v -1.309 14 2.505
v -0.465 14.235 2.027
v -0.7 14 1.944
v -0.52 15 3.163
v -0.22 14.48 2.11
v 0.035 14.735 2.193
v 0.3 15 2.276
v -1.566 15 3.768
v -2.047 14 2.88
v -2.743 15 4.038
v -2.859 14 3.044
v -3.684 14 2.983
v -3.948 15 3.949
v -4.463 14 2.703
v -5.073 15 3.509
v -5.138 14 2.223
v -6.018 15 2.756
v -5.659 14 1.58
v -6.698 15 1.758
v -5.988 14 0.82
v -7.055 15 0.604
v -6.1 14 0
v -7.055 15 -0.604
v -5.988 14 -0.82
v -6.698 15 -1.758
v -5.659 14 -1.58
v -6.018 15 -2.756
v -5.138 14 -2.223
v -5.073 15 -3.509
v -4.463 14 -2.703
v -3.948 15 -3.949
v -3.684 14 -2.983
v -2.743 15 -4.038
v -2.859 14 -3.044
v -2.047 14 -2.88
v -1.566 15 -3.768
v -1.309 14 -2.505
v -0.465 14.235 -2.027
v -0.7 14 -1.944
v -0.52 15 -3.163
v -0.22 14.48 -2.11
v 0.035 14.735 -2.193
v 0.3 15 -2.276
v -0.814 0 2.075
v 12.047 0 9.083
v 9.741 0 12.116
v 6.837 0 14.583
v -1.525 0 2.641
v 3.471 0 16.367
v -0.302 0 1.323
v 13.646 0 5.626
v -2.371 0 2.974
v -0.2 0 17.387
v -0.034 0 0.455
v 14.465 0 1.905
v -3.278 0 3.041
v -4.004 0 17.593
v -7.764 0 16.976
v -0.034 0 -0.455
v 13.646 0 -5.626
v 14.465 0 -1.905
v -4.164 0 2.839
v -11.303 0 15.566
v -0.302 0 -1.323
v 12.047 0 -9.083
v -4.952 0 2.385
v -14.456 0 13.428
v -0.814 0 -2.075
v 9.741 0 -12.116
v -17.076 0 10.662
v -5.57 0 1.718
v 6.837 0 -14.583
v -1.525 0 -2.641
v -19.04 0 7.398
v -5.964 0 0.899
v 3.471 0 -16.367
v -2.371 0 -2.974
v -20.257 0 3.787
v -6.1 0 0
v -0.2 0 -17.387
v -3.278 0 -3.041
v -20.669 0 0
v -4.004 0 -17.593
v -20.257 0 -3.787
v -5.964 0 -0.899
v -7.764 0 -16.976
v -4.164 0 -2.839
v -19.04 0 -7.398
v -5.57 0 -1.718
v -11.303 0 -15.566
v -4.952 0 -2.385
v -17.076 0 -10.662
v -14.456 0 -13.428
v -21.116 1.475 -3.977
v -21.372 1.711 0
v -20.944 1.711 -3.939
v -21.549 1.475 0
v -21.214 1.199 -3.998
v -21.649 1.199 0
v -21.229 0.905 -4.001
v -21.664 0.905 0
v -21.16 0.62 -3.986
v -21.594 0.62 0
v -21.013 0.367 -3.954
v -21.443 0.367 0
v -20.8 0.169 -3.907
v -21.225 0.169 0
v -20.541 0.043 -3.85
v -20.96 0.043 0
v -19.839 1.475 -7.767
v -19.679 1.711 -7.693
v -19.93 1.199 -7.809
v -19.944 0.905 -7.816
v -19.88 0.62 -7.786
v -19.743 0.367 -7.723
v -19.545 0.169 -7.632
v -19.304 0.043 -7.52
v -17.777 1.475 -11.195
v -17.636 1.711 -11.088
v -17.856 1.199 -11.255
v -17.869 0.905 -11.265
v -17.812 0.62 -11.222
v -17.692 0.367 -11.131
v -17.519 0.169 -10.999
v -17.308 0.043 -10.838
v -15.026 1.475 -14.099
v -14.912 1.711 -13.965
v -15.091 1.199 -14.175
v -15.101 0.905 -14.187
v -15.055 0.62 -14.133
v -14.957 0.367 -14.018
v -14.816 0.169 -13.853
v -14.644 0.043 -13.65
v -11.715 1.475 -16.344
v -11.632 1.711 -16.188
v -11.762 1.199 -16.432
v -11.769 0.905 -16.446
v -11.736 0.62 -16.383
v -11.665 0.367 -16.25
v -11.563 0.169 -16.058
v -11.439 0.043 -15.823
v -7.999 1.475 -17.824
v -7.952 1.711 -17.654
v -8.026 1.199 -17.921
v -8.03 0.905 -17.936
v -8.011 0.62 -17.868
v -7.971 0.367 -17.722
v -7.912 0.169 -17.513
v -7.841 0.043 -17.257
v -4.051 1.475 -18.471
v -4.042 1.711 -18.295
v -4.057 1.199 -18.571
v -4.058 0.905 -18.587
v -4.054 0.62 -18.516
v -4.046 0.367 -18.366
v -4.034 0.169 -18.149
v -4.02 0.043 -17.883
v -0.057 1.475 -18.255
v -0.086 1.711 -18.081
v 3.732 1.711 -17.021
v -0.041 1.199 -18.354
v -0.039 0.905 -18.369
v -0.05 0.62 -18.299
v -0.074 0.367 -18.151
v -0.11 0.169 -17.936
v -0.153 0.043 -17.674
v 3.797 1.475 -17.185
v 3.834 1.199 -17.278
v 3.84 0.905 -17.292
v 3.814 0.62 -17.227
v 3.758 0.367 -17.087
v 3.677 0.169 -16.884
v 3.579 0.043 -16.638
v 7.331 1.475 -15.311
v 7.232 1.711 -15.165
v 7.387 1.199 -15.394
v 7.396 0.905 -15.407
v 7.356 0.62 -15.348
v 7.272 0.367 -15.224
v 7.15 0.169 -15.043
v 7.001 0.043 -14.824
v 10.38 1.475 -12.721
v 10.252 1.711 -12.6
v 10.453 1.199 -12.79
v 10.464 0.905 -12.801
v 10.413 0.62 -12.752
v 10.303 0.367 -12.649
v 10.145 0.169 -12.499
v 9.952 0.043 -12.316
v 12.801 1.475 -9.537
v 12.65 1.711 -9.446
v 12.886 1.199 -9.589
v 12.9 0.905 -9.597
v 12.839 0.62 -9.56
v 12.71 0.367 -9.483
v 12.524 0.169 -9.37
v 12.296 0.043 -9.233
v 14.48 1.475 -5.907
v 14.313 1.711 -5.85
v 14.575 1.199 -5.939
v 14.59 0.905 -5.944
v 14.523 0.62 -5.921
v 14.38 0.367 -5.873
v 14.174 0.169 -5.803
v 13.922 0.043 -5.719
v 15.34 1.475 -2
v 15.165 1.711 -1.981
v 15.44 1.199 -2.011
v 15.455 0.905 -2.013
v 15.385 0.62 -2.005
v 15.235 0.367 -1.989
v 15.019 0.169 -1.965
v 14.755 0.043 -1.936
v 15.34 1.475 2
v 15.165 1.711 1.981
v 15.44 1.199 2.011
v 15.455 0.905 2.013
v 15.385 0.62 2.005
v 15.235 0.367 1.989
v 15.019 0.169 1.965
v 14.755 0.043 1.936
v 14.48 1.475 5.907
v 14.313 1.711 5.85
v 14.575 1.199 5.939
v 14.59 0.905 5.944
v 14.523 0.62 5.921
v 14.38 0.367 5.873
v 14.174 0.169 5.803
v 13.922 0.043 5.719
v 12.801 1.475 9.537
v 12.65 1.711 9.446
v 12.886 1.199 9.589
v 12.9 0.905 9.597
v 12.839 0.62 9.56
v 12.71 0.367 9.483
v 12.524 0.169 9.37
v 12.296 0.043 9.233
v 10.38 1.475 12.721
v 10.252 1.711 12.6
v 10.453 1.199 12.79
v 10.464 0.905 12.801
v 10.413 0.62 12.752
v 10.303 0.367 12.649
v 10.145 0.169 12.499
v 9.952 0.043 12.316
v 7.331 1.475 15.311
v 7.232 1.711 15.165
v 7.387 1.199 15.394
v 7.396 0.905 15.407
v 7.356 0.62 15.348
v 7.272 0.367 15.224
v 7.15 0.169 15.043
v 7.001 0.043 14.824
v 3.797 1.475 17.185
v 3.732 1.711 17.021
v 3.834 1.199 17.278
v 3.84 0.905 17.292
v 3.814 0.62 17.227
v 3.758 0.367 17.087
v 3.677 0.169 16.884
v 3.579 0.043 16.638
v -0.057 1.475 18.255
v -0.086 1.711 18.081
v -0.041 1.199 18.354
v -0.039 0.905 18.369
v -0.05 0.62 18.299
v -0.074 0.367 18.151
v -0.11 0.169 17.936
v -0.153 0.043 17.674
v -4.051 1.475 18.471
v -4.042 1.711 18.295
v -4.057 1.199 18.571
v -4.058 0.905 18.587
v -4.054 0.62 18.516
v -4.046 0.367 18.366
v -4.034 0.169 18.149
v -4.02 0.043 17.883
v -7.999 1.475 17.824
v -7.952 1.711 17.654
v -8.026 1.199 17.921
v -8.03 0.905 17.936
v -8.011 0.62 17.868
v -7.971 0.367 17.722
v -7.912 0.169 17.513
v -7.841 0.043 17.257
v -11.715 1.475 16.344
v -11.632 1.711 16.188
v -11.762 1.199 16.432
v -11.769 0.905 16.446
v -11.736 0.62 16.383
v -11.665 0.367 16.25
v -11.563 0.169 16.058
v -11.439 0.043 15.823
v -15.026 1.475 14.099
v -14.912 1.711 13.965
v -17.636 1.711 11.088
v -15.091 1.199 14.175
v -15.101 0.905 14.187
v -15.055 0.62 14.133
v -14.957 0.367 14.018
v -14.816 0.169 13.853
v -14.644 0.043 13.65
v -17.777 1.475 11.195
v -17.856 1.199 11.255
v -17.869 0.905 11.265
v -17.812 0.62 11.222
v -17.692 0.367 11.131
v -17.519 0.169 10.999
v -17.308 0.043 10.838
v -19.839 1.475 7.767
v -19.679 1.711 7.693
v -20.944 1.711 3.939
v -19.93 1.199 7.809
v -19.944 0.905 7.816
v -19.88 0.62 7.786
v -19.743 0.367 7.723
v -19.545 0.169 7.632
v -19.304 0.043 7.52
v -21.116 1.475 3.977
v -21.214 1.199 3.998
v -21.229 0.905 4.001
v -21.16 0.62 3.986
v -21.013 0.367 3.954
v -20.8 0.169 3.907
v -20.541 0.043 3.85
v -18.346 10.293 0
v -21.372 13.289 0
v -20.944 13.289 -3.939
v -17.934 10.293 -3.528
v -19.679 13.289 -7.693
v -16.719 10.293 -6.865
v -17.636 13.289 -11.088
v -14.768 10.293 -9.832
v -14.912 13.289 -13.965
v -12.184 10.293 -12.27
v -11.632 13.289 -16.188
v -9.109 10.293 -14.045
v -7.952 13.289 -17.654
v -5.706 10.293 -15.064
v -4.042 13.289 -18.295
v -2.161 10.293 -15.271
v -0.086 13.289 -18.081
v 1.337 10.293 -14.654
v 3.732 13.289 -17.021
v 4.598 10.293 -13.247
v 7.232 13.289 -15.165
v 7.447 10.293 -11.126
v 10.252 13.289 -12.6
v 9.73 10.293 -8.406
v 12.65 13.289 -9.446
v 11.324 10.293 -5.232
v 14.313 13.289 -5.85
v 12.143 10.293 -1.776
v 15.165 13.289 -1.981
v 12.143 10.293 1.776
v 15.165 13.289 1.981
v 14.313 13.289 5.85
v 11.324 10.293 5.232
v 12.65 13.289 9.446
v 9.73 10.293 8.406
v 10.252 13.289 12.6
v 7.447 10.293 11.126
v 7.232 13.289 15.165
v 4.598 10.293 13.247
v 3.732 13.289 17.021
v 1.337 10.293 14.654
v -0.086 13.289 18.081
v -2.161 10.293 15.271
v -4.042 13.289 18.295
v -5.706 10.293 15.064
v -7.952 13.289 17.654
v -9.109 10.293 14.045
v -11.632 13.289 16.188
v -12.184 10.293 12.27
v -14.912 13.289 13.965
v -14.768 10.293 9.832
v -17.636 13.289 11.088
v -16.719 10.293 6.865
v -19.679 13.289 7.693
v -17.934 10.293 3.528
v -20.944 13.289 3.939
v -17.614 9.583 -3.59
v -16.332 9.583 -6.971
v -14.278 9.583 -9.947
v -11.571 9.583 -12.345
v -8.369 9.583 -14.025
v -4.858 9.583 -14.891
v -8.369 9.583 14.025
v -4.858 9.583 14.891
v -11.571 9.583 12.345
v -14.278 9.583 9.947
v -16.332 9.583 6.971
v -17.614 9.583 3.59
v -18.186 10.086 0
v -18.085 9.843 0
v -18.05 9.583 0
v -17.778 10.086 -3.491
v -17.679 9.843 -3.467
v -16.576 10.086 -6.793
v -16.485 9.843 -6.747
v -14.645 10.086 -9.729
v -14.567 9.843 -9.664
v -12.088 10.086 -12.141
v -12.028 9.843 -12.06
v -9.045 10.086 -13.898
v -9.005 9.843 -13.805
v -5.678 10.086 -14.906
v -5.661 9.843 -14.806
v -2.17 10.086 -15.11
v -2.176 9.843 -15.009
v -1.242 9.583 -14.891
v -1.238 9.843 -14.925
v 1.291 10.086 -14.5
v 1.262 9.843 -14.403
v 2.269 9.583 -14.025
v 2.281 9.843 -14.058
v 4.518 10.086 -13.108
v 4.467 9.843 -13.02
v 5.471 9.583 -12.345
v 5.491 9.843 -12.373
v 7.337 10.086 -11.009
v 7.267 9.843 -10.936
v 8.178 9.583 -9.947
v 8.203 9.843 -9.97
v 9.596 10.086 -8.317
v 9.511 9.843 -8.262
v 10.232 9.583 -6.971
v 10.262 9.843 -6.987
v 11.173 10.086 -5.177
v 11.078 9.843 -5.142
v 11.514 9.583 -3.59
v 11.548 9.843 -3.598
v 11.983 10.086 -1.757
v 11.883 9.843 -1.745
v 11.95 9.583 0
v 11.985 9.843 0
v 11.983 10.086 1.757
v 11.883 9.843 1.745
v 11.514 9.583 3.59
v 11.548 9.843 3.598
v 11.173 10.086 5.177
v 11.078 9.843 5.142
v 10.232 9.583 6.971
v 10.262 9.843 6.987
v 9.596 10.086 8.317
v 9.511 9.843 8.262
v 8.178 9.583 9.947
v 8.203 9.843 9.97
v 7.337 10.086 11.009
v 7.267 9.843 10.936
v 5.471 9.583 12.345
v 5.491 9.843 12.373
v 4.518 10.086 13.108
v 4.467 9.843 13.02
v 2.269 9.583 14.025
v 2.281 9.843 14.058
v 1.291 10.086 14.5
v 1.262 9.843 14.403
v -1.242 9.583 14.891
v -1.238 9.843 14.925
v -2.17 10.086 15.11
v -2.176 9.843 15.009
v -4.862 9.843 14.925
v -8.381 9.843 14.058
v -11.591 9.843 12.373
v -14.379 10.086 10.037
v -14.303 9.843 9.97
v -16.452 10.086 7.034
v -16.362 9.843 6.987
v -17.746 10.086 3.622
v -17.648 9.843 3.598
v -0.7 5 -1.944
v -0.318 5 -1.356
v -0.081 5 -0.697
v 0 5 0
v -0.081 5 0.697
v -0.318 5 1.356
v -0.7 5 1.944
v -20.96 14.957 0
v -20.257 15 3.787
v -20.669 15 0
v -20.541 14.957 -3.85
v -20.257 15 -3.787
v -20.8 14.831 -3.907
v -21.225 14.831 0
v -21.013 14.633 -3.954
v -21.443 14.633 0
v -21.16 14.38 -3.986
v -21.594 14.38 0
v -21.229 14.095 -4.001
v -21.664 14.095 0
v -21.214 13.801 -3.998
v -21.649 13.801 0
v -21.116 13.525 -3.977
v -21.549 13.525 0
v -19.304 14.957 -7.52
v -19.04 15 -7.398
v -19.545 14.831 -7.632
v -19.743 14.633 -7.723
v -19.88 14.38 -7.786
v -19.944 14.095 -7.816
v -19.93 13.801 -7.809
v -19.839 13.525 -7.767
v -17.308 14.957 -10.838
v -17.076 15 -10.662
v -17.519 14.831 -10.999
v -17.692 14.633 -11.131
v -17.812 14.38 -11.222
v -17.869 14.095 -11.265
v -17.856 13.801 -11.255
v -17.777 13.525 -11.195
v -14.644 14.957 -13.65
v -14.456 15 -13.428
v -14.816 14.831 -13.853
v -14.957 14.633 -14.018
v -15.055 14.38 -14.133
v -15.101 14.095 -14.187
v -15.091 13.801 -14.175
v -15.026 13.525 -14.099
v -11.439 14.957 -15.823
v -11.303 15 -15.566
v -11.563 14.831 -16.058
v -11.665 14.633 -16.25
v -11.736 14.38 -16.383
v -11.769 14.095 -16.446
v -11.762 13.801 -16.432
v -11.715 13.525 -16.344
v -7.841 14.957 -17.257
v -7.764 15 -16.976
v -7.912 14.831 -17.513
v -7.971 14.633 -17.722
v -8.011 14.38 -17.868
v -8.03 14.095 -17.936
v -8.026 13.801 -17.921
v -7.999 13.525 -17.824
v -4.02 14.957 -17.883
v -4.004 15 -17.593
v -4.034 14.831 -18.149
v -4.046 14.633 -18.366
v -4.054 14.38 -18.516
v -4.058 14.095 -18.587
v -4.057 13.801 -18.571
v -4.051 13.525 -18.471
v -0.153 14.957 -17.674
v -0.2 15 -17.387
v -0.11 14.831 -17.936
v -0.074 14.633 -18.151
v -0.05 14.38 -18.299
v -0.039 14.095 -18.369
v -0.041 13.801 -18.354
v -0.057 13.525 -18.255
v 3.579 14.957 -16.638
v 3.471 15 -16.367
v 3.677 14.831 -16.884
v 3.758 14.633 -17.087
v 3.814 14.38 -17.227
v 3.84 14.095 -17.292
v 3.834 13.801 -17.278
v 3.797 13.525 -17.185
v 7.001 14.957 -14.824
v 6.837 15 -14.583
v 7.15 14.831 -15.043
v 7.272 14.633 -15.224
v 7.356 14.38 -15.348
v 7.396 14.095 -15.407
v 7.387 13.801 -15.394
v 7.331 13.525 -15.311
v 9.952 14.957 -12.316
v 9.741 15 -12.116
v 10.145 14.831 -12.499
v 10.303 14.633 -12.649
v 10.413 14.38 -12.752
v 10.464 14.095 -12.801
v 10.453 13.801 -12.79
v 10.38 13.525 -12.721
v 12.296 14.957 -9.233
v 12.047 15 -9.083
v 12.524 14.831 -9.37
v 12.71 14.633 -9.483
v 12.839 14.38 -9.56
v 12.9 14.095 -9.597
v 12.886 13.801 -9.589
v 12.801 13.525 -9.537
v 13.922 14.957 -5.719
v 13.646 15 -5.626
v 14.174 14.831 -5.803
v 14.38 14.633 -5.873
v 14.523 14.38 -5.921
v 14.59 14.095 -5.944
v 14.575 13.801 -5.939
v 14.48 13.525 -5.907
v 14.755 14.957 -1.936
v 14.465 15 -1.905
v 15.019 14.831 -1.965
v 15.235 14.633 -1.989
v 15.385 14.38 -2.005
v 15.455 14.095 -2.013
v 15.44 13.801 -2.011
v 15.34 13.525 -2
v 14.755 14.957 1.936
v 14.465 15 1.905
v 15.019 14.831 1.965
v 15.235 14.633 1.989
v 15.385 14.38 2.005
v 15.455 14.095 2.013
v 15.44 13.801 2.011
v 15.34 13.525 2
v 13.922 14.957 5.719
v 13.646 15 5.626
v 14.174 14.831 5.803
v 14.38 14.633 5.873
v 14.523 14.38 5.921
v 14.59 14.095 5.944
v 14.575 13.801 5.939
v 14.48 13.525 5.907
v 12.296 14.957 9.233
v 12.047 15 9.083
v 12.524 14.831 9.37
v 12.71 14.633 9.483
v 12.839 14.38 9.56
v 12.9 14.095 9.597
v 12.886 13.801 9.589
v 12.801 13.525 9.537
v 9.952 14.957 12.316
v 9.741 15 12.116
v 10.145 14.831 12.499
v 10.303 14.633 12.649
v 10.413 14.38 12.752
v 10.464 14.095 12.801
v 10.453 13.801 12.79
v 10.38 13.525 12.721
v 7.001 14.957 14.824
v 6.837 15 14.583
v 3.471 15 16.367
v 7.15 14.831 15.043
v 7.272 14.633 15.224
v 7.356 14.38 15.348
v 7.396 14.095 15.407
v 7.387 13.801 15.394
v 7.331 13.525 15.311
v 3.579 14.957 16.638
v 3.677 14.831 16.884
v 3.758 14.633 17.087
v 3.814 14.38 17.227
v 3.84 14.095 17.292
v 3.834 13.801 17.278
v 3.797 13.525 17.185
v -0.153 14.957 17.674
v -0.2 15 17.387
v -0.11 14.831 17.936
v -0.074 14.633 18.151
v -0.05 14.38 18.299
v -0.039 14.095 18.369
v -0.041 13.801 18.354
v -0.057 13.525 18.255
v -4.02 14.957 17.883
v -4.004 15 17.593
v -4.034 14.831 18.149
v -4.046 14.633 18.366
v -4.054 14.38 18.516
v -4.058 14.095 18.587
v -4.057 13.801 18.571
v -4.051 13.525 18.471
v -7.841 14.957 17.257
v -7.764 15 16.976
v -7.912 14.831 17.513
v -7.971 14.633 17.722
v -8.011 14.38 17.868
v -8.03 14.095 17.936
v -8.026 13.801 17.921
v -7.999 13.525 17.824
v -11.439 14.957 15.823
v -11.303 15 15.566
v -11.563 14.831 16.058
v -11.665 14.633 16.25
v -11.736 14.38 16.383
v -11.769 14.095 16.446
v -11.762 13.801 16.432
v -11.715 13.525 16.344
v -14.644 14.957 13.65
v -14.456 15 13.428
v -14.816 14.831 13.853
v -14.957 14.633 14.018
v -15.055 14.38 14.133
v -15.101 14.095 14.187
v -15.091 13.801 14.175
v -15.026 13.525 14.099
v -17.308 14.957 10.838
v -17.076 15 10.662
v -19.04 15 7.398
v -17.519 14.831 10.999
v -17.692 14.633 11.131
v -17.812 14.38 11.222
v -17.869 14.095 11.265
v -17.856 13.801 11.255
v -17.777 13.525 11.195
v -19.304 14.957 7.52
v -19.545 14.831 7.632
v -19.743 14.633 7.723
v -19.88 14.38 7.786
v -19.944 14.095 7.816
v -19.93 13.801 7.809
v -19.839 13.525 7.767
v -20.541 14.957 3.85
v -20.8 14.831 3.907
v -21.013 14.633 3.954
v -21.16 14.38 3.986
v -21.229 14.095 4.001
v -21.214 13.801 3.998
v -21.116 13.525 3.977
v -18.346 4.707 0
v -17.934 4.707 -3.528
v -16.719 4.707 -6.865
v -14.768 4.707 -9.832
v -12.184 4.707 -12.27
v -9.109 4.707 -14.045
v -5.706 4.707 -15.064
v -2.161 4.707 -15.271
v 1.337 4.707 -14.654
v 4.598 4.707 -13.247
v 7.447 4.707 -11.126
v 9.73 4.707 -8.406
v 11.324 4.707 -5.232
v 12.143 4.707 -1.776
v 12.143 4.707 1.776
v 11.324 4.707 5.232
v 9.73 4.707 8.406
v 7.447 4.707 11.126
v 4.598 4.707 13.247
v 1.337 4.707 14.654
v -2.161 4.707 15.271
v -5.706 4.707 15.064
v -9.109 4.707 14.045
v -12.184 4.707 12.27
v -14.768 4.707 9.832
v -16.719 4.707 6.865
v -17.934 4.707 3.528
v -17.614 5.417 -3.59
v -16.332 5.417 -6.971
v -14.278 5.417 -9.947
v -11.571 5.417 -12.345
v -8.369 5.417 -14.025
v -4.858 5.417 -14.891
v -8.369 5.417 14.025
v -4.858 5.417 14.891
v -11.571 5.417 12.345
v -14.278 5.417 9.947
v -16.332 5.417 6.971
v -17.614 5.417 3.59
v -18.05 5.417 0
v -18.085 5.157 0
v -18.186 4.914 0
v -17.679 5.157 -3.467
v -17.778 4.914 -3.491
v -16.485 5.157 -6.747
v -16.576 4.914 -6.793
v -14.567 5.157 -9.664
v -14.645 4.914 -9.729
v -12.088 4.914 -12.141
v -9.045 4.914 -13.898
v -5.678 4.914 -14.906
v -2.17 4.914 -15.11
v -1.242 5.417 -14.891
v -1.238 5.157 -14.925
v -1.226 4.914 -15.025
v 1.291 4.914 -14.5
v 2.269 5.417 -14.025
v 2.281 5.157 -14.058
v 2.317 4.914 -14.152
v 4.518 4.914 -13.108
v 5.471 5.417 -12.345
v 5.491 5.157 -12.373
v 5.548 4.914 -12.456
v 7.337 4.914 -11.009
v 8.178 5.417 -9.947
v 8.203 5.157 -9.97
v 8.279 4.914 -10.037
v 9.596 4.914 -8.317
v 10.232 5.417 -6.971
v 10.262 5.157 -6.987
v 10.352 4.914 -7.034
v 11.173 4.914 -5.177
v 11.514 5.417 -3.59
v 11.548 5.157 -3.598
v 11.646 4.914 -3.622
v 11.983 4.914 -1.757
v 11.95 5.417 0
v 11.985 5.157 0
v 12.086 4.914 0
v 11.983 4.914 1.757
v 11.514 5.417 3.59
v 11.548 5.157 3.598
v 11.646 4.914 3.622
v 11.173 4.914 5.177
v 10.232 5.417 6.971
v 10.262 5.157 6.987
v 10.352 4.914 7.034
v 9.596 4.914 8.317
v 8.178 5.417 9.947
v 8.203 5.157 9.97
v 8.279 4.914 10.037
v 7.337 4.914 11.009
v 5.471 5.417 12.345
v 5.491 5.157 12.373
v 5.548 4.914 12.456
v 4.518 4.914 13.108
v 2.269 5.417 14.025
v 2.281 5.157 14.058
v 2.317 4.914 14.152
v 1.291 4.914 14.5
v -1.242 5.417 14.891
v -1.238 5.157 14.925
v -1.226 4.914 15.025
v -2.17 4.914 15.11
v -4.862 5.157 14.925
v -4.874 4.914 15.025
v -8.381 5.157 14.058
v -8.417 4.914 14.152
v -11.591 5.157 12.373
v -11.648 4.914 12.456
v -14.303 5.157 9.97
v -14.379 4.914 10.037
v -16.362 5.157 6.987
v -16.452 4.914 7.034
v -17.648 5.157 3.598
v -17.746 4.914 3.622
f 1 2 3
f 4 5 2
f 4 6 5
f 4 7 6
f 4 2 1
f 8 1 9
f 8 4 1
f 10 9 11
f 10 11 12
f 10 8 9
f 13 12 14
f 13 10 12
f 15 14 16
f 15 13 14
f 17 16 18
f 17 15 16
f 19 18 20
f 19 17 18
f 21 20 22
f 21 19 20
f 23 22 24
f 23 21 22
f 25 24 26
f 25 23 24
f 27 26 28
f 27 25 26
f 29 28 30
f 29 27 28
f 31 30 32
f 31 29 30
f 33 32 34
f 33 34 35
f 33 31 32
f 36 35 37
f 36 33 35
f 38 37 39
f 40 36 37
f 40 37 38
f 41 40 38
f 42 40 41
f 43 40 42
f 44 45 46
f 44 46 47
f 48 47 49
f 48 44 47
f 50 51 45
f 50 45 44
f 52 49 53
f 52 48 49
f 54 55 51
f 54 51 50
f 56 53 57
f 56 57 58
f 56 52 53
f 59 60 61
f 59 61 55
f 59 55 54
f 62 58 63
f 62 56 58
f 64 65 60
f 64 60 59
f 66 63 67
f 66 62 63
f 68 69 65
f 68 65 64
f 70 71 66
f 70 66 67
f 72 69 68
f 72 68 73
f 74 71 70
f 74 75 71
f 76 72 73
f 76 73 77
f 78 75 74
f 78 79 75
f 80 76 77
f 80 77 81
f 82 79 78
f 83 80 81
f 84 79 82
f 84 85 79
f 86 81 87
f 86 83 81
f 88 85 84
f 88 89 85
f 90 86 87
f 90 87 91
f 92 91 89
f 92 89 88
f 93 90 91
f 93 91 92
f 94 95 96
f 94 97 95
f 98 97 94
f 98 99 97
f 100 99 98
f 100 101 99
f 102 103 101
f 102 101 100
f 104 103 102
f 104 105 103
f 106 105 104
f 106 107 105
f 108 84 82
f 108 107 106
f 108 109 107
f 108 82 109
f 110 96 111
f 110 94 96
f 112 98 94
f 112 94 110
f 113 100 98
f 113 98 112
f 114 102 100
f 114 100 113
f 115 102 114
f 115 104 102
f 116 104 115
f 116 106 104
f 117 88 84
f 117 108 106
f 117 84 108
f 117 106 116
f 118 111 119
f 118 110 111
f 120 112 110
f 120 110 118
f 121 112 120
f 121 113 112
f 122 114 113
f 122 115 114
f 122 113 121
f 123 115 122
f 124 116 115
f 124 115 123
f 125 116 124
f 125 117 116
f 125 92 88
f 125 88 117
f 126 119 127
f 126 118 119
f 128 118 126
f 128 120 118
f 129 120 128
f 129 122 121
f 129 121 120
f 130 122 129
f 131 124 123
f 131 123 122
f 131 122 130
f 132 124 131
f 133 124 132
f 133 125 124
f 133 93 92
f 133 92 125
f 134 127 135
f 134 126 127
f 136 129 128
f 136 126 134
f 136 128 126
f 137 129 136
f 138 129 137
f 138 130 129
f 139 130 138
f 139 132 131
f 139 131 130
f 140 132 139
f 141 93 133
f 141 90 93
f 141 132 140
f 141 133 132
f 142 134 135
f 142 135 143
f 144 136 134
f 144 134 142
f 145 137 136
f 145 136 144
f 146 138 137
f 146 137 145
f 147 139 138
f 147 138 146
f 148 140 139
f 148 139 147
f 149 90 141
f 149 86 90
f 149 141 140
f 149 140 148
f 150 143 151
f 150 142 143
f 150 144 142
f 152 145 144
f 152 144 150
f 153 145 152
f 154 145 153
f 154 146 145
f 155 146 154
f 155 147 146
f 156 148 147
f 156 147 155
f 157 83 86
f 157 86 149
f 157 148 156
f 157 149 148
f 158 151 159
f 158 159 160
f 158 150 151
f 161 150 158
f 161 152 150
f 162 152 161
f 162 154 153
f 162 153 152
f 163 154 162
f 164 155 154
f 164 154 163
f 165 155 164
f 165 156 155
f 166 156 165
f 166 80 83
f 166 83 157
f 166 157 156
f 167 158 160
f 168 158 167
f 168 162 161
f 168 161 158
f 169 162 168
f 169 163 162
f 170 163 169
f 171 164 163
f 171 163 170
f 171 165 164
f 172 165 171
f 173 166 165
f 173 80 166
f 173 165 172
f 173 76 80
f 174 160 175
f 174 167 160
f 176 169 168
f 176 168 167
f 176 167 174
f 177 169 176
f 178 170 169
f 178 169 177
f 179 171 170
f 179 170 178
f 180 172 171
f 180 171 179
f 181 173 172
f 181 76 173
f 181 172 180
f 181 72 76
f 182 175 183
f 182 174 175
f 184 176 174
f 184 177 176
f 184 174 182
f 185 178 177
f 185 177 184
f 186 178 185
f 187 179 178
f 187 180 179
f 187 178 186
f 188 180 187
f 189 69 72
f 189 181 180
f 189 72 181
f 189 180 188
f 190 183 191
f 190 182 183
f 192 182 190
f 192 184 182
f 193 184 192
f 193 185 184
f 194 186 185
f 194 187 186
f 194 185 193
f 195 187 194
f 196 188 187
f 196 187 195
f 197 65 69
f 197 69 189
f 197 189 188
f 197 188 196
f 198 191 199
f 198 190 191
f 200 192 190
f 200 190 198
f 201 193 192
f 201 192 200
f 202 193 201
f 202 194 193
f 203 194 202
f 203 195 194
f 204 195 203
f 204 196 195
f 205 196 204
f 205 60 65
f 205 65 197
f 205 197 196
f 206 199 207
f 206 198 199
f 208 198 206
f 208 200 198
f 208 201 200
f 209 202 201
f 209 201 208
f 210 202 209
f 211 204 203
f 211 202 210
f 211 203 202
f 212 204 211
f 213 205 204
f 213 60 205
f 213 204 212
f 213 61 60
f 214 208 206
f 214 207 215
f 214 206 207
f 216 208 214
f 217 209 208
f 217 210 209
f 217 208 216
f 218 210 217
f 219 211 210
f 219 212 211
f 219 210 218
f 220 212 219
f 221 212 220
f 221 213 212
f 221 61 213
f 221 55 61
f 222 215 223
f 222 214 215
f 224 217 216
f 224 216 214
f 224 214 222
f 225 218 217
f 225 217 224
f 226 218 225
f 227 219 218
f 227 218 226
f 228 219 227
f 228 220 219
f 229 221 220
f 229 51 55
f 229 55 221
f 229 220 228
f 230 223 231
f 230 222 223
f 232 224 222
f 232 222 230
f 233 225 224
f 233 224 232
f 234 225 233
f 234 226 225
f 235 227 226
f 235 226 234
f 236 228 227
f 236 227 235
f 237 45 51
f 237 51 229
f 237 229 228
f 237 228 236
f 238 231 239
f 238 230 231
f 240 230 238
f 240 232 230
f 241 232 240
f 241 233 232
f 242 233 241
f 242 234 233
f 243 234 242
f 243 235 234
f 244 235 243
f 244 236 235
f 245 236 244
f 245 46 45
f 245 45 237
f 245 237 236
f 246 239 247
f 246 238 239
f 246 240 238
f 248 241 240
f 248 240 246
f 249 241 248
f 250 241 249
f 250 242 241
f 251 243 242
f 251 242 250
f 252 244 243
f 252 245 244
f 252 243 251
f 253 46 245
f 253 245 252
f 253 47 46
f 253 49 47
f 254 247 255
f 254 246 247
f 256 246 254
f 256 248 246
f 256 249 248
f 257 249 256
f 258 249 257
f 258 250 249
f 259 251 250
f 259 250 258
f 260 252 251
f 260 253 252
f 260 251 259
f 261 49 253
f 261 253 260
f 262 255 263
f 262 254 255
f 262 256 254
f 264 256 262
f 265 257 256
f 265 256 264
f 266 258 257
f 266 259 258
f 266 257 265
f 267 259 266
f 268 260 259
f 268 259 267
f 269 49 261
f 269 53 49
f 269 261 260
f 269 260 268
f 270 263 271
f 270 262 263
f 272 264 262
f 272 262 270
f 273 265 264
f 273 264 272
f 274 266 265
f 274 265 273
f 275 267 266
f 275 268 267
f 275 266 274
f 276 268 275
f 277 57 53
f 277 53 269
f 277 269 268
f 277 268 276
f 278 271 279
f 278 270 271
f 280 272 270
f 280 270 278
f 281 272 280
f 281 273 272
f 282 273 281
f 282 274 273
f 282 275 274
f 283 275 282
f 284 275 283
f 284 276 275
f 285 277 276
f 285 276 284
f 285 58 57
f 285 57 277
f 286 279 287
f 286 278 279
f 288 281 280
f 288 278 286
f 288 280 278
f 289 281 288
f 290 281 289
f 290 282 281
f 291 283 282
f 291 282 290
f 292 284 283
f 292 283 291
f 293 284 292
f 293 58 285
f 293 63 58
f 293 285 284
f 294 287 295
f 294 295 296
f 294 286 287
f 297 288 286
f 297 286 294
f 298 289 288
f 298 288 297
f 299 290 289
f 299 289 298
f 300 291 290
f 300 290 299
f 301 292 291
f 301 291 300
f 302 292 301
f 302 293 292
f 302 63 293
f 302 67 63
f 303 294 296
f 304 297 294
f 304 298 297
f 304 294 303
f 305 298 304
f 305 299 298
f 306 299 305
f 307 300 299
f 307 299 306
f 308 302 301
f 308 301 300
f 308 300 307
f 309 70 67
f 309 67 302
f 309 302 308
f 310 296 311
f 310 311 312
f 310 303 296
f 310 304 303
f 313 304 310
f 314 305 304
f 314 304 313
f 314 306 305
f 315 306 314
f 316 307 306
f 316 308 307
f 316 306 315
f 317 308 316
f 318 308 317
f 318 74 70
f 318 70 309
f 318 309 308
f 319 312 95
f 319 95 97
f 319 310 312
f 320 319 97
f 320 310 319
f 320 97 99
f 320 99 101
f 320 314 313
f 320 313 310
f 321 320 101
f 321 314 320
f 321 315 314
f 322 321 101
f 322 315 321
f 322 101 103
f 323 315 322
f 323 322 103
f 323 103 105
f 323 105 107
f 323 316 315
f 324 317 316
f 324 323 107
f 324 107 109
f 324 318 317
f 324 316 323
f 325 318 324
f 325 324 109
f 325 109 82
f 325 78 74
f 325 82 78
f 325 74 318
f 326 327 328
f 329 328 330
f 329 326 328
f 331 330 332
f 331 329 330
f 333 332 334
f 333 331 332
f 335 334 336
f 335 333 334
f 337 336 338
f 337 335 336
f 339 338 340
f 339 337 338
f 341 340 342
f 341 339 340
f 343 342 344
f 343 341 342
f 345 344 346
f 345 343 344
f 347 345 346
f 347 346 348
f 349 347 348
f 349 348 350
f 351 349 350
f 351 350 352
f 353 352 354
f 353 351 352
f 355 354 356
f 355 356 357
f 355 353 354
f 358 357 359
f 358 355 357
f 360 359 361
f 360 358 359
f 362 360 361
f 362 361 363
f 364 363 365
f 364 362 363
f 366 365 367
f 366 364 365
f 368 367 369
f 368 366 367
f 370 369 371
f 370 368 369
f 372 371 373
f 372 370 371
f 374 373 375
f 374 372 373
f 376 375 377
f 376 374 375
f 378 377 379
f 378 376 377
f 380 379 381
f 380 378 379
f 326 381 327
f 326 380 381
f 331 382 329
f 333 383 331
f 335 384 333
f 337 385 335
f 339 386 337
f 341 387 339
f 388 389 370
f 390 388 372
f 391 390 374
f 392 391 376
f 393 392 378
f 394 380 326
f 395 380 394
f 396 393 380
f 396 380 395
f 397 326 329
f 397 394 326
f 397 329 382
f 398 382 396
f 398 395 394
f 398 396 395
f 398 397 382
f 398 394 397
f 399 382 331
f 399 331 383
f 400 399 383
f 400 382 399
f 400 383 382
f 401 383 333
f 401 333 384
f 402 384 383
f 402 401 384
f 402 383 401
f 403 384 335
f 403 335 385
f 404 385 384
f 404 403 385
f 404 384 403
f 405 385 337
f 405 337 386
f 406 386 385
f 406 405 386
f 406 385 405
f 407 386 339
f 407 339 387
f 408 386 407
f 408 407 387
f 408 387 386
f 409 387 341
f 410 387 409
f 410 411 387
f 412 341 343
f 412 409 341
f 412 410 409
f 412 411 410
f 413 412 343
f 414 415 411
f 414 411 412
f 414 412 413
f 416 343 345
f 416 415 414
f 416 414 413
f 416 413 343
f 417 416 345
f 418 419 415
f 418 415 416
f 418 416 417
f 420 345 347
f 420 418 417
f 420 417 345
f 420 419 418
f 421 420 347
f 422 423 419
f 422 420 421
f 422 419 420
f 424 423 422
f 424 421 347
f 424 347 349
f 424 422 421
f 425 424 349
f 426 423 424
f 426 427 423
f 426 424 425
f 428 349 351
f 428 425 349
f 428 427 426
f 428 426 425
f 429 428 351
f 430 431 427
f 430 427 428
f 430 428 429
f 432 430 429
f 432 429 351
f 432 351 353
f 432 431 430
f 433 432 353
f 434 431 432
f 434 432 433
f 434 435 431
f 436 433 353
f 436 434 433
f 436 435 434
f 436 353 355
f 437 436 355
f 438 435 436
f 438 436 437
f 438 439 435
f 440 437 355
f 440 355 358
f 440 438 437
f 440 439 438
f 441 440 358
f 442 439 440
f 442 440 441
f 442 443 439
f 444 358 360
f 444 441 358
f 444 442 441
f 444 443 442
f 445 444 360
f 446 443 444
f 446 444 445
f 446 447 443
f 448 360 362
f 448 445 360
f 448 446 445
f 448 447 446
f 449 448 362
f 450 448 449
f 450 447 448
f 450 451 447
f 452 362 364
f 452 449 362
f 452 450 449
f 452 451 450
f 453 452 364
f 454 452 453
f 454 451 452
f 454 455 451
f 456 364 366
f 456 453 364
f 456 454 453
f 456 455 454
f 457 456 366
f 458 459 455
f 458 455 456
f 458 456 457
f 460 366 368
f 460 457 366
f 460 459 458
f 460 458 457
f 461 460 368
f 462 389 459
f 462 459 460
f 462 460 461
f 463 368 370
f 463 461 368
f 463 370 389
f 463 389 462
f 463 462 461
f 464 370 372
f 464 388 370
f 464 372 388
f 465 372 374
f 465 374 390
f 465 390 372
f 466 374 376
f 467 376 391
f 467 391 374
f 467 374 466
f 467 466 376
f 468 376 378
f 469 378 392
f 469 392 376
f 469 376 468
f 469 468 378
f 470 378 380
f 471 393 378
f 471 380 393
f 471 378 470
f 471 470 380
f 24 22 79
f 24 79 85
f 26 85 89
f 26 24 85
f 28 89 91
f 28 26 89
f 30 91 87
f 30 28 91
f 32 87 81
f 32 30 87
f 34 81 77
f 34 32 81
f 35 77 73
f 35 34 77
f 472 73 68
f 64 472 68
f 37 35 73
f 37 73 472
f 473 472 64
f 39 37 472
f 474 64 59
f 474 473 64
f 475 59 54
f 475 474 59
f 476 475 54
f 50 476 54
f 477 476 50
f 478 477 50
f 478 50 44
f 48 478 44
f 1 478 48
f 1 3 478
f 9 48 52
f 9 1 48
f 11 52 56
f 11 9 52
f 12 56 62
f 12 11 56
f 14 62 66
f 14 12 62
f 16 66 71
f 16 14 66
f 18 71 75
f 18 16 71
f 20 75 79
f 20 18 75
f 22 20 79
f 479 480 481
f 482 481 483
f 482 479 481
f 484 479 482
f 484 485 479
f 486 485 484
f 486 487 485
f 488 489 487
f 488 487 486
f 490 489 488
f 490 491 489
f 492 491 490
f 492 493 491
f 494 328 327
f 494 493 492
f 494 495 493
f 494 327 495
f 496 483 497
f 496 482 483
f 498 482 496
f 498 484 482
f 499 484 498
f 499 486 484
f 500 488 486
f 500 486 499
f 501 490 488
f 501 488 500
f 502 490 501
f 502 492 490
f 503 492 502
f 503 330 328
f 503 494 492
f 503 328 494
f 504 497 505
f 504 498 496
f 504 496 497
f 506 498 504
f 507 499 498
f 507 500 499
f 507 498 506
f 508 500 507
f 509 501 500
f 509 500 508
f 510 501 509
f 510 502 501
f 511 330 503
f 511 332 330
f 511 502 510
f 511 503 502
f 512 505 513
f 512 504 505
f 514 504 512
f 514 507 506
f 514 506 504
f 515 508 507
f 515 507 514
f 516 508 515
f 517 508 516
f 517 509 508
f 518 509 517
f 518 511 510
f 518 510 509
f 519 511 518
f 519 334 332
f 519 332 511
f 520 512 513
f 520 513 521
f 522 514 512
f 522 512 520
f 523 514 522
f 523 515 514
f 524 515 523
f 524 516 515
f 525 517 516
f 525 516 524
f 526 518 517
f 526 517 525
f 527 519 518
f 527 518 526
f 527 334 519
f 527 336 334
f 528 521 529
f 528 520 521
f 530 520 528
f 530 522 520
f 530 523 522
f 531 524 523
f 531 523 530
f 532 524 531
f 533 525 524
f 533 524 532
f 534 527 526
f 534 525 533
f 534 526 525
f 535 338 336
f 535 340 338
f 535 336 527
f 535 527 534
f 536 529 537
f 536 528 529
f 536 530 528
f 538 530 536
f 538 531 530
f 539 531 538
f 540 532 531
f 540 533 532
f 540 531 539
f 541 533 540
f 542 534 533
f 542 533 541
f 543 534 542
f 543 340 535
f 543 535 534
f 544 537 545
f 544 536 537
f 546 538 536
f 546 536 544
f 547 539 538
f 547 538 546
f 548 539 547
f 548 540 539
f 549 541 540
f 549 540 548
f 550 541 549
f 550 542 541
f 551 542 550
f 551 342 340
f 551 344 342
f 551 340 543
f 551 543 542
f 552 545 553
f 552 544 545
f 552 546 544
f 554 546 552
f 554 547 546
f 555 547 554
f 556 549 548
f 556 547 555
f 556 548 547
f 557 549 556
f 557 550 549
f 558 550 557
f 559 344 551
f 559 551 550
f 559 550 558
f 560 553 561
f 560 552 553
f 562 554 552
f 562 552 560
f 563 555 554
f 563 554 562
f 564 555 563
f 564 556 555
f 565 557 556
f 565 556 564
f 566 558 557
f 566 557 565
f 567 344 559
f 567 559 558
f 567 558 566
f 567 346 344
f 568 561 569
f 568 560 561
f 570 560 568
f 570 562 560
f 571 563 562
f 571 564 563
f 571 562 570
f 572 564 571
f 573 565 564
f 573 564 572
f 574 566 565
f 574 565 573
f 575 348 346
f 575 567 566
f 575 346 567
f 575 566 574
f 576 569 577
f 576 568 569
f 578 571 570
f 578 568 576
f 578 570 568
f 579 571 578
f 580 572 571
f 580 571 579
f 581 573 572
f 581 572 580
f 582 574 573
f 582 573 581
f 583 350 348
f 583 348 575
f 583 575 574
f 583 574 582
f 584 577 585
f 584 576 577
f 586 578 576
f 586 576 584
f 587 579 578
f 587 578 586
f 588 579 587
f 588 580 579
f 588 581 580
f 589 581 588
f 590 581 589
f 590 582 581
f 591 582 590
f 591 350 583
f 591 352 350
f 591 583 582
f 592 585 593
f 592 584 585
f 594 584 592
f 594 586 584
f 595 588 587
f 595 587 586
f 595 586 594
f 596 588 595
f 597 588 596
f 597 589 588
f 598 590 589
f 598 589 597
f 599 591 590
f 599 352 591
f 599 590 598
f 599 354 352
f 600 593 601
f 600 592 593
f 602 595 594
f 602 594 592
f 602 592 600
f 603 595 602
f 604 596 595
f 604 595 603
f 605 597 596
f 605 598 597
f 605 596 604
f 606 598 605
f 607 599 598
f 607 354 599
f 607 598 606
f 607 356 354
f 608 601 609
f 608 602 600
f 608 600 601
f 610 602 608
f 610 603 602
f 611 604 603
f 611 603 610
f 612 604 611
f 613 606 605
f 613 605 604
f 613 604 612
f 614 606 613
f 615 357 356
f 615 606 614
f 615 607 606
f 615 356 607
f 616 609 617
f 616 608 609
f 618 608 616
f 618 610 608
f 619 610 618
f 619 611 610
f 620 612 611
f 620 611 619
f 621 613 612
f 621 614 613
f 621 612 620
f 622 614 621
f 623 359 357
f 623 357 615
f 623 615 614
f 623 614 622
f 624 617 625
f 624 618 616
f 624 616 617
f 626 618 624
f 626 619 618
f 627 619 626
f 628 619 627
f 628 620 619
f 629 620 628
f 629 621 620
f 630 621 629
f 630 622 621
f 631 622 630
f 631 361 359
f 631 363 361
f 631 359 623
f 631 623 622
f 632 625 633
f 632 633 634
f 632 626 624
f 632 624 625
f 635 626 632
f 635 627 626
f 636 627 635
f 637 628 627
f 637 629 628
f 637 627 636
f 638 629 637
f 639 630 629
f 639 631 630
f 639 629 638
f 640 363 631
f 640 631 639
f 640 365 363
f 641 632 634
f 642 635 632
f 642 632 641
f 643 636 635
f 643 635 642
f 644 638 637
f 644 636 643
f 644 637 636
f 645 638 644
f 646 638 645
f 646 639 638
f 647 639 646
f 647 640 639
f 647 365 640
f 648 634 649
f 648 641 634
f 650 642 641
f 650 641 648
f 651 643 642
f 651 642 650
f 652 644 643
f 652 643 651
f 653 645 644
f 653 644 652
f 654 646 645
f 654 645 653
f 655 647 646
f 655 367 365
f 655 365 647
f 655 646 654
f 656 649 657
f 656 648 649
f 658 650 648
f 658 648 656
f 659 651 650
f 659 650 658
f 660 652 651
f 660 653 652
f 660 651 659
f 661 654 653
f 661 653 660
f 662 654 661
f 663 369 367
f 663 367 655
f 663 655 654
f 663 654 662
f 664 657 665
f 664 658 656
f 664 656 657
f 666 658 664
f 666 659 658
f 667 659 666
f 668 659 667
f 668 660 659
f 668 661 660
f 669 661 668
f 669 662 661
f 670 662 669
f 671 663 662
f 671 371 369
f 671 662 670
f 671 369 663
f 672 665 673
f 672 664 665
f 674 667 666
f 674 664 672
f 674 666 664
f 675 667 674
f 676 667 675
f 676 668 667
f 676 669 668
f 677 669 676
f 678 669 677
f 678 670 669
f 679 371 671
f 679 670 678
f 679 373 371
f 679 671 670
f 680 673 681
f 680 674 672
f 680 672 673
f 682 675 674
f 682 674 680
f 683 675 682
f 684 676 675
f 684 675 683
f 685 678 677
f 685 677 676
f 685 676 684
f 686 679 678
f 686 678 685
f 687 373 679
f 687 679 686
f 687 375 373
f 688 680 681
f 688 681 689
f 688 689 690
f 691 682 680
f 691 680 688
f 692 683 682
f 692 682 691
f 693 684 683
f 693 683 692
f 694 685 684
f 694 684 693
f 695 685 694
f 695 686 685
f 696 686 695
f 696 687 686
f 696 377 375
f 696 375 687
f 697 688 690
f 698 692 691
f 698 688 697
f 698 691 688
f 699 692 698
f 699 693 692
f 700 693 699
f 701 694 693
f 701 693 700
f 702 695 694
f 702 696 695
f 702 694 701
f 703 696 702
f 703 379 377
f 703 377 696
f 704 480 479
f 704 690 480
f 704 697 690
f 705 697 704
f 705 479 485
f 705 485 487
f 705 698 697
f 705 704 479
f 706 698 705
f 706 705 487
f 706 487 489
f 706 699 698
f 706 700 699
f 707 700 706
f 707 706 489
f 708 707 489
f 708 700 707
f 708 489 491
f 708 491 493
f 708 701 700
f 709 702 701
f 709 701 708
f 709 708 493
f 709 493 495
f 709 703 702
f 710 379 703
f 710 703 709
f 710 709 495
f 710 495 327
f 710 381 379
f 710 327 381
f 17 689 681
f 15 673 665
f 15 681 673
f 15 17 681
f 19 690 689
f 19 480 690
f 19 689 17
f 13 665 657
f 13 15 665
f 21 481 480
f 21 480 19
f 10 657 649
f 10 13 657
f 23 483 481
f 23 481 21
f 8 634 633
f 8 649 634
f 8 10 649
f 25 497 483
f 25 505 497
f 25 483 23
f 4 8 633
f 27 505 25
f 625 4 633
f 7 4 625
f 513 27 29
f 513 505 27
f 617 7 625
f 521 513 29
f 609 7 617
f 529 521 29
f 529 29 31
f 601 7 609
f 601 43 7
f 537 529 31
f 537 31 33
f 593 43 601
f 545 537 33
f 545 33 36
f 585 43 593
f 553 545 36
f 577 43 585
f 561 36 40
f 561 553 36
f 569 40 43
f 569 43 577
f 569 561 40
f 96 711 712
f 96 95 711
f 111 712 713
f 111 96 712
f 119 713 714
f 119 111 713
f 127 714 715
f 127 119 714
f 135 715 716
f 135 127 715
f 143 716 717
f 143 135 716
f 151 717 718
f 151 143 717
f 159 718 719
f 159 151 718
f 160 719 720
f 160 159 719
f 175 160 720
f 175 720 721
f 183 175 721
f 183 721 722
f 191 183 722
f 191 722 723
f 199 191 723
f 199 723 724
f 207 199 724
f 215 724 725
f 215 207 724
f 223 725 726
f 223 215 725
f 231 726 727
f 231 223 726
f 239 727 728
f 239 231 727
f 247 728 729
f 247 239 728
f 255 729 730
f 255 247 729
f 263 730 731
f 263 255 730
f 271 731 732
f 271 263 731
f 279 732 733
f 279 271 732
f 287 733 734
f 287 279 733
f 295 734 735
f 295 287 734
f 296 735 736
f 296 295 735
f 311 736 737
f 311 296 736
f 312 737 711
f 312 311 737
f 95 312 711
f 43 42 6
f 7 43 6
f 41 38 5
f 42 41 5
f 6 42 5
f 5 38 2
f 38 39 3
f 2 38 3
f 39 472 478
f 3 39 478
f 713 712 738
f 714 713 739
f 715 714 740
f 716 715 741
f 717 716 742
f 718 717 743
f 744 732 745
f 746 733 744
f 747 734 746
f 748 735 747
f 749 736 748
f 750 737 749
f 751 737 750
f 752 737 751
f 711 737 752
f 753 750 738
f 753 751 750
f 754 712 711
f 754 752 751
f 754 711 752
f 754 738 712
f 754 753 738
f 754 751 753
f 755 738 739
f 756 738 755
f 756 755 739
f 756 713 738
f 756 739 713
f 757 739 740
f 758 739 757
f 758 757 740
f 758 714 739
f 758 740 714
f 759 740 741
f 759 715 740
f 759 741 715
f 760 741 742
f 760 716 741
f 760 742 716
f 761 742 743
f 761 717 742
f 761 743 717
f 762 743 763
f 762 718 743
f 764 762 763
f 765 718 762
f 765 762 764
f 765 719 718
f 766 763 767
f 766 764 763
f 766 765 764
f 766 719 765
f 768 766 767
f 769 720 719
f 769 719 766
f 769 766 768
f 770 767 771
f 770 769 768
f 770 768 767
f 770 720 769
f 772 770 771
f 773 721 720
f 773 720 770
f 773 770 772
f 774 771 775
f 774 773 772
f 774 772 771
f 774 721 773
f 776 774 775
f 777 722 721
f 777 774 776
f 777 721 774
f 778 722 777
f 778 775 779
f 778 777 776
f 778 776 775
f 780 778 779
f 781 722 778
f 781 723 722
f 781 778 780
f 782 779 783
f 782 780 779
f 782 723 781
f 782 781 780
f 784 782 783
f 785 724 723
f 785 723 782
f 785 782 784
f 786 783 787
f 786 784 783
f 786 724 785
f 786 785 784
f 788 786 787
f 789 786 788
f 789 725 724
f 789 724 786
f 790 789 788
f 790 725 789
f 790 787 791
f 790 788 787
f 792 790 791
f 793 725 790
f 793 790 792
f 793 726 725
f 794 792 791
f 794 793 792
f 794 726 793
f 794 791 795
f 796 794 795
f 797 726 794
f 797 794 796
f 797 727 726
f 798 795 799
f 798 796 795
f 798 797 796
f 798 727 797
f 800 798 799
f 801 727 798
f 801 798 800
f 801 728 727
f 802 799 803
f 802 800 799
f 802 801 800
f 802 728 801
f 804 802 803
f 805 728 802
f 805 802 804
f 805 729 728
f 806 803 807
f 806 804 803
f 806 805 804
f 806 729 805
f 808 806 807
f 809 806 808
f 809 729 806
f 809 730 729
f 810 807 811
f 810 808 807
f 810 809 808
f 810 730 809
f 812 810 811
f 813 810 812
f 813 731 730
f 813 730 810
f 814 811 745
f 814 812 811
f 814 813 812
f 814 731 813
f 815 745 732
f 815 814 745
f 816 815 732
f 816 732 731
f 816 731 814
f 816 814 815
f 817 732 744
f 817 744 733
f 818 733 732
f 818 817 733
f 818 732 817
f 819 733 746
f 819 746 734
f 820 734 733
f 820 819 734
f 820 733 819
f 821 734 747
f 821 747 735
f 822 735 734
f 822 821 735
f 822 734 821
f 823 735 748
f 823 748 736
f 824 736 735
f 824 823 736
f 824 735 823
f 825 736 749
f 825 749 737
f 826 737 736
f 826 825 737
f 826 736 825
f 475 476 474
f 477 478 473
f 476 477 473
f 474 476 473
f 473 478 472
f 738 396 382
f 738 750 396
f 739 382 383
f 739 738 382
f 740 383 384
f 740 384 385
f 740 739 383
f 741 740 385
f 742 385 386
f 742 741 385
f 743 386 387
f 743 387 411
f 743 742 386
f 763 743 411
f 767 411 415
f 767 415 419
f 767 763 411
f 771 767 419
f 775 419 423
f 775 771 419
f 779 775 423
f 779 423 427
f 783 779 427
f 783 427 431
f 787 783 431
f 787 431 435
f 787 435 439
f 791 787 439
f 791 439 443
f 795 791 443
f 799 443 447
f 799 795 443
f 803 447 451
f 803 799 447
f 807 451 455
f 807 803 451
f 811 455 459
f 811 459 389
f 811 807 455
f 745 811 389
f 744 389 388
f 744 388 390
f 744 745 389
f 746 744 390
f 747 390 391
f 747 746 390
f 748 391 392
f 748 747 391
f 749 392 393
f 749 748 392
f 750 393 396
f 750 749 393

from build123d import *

# Parameters (mm, degrees)
BOSS_EXTRUDE1_DEPTH = 10
CHAMFER1_SIZE       = 1


with BuildPart() as part:
    # Sketch1 → Revolve1 (revolve)
    with BuildSketch(Plane.XY):
        with BuildLine():
            Line((0, 0), (0, 15))
            Line((0, 15), (14.56869778, 15))
            ThreePointArc((14.56869778, 15), (15.493526394, 14.380384062), (15.27227791, 13.289384069))
            Line((15.27227791, 13.289384069), (12.24641987, 10.29348502))
            ThreePointArc((12.24641987, 10.29348502), (12.027075266, 9.967849524), (11.95, 9.582869089))
            Line((11.95, 9.582869089), (11.95, 5.417130911))
            ThreePointArc((11.95, 5.417130911), (12.027075266, 5.032150476), (12.24641987, 4.70651498))
            Line((12.24641987, 4.70651498), (15.27227791, 1.710615931))
            ThreePointArc((15.27227791, 1.710615931), (15.493526394, 0.619615938), (14.56869778, 0))
            Line((14.56869778, 0), (0, 0))
        make_face()
    revolve(axis=Axis((-3.05, 12, 0), (0, -1, 0)))

    # Sketch2 → Boss-Extrude1 (add)
    with BuildSketch(Plane(origin=(0, 15, 0), x_dir=(1, 0, 0), z_dir=(0, 1, 0))):
        with BuildLine():
            ThreePointArc((0, 0), (-0.18033103, 1.033198916), (-0.7, 1.94422221))
            Line((-0.7, 1.94422221), (-0.7, -1.94422221))
            ThreePointArc((-0.7, -1.94422221), (-0.18033103, -1.033198916), (0, 0))
        make_face()
    extrude(amount=-BOSS_EXTRUDE1_DEPTH)

    # Chamfer1
    chamfer1_edges = [part.edges().sort_by_distance(p)[0] for p in [
        (-0.7, 15, 0),
        (-6.1, 15, 0),
    ]]
    chamfer(chamfer1_edges, length=CHAMFER1_SIZE)


solid = part.part
